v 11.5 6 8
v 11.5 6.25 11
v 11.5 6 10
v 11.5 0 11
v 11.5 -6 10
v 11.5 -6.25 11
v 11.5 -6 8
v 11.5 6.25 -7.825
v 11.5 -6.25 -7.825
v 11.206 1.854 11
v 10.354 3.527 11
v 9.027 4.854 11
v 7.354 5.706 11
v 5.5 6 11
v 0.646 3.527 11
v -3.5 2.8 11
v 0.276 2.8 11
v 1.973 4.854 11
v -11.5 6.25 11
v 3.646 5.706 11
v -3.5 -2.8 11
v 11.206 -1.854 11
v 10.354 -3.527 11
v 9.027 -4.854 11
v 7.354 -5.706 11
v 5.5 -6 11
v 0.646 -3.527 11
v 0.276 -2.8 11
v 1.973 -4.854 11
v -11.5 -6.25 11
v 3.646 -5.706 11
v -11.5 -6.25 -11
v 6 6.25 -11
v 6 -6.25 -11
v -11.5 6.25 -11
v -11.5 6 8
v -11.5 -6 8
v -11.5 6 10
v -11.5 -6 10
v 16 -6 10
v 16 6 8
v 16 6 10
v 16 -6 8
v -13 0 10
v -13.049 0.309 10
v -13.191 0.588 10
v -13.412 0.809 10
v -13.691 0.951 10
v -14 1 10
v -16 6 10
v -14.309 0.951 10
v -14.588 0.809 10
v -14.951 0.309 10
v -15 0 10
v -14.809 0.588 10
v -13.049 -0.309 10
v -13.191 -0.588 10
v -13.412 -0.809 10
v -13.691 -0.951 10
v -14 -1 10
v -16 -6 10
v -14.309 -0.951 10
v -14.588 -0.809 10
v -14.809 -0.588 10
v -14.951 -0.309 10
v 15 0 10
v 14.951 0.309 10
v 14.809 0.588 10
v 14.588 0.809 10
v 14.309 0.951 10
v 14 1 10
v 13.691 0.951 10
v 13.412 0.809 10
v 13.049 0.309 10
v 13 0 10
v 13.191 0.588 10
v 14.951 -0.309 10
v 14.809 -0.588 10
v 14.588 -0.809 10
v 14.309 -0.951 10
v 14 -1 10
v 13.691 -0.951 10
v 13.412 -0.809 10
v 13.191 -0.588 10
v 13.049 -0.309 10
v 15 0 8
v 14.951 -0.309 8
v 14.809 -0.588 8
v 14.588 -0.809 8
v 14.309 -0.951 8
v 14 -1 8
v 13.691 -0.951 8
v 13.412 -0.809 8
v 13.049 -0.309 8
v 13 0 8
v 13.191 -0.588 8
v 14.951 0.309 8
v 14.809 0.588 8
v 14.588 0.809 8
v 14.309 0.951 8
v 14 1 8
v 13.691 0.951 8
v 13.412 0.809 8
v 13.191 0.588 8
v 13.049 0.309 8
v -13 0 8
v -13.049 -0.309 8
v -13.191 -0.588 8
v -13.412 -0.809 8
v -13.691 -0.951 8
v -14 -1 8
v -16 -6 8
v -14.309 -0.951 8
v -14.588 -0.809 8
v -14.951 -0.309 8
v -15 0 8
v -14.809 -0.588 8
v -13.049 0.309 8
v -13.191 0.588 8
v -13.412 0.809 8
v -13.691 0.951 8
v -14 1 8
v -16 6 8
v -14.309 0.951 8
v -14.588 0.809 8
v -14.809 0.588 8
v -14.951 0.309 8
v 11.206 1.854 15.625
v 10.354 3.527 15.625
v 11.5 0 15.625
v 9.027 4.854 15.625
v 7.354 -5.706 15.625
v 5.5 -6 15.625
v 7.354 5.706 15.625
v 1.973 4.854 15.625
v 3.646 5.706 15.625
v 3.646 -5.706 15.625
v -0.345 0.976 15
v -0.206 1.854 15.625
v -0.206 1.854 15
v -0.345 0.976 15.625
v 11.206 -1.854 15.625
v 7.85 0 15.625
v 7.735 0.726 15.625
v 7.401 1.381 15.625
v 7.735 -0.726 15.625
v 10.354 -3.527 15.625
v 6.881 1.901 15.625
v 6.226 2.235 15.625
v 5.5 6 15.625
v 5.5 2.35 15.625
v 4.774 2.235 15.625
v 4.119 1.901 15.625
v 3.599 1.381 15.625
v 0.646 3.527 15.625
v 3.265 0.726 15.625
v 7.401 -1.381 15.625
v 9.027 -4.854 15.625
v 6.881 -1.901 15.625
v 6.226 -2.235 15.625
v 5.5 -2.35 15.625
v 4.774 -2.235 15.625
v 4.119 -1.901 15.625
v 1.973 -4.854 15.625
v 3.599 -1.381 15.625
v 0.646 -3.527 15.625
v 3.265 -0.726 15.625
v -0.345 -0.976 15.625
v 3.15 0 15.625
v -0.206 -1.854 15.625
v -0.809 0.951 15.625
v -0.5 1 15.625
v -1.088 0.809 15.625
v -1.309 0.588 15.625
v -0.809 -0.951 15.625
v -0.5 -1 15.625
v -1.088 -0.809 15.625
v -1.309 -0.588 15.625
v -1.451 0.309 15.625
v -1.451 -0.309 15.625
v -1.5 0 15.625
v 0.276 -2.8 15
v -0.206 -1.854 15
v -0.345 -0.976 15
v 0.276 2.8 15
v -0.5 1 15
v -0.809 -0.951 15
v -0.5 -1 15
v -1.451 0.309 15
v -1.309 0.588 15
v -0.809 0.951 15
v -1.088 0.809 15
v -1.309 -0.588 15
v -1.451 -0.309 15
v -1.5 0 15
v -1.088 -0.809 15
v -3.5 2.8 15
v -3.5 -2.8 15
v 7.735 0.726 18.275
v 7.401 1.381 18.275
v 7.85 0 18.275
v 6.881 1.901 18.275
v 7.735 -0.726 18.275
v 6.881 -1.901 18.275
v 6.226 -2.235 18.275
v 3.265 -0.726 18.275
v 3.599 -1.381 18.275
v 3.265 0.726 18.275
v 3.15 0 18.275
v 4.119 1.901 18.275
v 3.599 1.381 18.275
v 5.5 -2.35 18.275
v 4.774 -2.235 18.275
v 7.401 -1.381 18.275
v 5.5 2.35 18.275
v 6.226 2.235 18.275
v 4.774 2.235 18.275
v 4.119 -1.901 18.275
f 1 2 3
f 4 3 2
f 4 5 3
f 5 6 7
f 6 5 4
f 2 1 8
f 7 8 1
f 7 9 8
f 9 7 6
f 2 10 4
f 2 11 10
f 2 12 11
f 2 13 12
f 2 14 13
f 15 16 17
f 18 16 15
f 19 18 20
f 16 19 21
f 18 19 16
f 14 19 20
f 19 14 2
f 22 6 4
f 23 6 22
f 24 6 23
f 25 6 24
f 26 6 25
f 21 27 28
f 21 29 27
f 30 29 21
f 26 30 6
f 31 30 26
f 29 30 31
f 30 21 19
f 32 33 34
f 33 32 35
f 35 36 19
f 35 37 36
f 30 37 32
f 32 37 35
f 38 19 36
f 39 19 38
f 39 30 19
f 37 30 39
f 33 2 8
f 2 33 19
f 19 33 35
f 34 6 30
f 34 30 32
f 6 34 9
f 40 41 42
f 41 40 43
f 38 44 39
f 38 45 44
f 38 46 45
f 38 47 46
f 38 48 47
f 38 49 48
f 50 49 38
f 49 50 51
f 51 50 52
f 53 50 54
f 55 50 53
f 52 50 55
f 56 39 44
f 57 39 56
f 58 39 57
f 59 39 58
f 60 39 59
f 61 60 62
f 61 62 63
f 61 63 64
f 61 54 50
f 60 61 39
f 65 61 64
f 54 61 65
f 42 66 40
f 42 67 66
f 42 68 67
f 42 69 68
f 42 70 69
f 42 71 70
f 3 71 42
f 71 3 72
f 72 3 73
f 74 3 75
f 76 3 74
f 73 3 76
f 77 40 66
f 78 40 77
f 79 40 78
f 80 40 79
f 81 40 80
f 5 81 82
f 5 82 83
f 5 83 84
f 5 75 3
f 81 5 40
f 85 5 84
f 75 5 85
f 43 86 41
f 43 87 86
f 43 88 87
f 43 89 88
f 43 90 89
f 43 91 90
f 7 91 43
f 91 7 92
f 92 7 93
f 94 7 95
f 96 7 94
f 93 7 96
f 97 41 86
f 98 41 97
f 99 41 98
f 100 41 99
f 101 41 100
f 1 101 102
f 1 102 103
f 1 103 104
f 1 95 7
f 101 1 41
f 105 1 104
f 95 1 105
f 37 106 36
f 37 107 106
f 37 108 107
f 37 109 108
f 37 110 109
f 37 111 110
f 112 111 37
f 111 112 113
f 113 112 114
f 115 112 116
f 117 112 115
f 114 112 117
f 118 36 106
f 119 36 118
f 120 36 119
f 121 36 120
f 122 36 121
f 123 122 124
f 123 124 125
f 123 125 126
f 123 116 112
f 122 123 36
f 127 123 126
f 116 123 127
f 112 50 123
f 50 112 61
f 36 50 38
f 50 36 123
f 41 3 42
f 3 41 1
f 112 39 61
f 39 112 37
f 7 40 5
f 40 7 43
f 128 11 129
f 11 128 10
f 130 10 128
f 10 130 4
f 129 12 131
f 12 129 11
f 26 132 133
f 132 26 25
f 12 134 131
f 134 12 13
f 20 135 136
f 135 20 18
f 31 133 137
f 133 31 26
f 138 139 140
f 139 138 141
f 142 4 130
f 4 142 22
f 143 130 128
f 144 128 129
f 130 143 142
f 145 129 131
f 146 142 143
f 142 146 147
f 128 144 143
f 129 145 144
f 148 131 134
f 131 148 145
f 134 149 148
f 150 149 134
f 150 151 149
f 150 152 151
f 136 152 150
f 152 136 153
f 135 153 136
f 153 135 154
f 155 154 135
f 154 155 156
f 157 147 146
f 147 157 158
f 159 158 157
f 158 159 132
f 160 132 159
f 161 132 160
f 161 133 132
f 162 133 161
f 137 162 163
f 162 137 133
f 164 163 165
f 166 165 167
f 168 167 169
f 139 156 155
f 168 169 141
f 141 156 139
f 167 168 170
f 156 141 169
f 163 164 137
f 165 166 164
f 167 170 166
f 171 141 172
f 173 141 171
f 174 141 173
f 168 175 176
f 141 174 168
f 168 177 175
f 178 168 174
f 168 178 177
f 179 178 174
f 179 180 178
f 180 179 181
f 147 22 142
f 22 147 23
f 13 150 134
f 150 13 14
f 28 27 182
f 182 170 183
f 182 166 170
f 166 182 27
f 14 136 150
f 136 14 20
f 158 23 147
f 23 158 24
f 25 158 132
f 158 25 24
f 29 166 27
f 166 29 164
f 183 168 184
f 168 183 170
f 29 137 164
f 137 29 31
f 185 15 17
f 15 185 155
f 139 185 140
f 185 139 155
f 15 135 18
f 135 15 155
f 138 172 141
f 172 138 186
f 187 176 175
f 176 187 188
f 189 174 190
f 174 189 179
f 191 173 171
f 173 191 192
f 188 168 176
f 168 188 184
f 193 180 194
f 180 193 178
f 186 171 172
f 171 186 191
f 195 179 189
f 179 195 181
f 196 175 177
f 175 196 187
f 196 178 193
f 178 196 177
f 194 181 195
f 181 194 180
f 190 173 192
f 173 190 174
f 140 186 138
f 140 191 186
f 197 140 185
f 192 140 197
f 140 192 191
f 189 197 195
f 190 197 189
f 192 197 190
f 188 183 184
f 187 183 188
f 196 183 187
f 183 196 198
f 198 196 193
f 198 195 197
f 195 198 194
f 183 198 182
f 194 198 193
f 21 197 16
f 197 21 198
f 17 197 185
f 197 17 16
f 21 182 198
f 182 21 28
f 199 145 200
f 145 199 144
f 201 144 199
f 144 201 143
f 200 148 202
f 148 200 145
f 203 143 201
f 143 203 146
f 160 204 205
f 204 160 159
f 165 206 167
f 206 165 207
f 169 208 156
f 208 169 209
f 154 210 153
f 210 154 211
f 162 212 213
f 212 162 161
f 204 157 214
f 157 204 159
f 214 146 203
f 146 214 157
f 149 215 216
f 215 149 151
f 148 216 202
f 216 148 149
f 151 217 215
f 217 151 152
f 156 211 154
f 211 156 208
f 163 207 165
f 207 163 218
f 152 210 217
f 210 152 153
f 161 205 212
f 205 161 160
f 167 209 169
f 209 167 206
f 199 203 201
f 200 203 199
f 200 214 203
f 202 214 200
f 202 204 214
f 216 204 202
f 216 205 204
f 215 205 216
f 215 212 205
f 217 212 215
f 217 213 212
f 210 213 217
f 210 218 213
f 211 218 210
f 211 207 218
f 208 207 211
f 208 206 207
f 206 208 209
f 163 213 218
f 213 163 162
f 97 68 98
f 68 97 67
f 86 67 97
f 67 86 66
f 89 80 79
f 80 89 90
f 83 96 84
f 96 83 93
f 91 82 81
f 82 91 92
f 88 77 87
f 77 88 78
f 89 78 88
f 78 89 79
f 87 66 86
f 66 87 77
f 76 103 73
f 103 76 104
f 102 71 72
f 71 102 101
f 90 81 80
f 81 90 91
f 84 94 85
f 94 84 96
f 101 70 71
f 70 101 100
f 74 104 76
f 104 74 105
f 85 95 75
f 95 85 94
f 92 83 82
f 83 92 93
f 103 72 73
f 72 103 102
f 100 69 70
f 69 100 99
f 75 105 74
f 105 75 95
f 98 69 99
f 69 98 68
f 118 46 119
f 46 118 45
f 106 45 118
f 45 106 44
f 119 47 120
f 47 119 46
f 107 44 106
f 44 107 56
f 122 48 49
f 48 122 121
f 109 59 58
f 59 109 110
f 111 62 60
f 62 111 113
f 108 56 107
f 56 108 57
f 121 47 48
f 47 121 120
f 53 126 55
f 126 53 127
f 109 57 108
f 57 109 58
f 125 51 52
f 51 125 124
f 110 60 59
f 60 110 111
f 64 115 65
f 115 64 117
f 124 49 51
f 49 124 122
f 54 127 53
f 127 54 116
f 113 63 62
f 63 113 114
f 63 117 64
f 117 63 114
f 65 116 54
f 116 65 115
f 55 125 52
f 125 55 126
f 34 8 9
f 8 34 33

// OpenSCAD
9g_motor();

module 9g_motor(){
	difference(){			
		union(){
			color("steel blue") cube([23,12.5,22], center=true);
			color("steel blue") translate([0,0,9]) cube([32,12,2], center=true);
			color("steel blue") translate([5.5,0,2.75]) cylinder(r=6, h=25.75, $fn=20, center=true);
			color("steel blue") translate([-.5,0,2.75]) cylinder(r=1, h=25.75, $fn=20, center=true);
			color("steel blue") translate([-1,0,2.75]) cube([5,5.6,24.5], center=true);		
			color("white") translate([5.5,0,3.65]) cylinder(r=2.35, h=29.25, $fn=20, center=true);				
		}
		translate([10,0,-11]) rotate([0,-30,0]) cube([8,13,4], center=true);
		for ( hole = [14,-14] ){
			translate([hole,0,9]) cylinder(r=1, h=4, $fn=20, center=true);
		}	
	}
}
